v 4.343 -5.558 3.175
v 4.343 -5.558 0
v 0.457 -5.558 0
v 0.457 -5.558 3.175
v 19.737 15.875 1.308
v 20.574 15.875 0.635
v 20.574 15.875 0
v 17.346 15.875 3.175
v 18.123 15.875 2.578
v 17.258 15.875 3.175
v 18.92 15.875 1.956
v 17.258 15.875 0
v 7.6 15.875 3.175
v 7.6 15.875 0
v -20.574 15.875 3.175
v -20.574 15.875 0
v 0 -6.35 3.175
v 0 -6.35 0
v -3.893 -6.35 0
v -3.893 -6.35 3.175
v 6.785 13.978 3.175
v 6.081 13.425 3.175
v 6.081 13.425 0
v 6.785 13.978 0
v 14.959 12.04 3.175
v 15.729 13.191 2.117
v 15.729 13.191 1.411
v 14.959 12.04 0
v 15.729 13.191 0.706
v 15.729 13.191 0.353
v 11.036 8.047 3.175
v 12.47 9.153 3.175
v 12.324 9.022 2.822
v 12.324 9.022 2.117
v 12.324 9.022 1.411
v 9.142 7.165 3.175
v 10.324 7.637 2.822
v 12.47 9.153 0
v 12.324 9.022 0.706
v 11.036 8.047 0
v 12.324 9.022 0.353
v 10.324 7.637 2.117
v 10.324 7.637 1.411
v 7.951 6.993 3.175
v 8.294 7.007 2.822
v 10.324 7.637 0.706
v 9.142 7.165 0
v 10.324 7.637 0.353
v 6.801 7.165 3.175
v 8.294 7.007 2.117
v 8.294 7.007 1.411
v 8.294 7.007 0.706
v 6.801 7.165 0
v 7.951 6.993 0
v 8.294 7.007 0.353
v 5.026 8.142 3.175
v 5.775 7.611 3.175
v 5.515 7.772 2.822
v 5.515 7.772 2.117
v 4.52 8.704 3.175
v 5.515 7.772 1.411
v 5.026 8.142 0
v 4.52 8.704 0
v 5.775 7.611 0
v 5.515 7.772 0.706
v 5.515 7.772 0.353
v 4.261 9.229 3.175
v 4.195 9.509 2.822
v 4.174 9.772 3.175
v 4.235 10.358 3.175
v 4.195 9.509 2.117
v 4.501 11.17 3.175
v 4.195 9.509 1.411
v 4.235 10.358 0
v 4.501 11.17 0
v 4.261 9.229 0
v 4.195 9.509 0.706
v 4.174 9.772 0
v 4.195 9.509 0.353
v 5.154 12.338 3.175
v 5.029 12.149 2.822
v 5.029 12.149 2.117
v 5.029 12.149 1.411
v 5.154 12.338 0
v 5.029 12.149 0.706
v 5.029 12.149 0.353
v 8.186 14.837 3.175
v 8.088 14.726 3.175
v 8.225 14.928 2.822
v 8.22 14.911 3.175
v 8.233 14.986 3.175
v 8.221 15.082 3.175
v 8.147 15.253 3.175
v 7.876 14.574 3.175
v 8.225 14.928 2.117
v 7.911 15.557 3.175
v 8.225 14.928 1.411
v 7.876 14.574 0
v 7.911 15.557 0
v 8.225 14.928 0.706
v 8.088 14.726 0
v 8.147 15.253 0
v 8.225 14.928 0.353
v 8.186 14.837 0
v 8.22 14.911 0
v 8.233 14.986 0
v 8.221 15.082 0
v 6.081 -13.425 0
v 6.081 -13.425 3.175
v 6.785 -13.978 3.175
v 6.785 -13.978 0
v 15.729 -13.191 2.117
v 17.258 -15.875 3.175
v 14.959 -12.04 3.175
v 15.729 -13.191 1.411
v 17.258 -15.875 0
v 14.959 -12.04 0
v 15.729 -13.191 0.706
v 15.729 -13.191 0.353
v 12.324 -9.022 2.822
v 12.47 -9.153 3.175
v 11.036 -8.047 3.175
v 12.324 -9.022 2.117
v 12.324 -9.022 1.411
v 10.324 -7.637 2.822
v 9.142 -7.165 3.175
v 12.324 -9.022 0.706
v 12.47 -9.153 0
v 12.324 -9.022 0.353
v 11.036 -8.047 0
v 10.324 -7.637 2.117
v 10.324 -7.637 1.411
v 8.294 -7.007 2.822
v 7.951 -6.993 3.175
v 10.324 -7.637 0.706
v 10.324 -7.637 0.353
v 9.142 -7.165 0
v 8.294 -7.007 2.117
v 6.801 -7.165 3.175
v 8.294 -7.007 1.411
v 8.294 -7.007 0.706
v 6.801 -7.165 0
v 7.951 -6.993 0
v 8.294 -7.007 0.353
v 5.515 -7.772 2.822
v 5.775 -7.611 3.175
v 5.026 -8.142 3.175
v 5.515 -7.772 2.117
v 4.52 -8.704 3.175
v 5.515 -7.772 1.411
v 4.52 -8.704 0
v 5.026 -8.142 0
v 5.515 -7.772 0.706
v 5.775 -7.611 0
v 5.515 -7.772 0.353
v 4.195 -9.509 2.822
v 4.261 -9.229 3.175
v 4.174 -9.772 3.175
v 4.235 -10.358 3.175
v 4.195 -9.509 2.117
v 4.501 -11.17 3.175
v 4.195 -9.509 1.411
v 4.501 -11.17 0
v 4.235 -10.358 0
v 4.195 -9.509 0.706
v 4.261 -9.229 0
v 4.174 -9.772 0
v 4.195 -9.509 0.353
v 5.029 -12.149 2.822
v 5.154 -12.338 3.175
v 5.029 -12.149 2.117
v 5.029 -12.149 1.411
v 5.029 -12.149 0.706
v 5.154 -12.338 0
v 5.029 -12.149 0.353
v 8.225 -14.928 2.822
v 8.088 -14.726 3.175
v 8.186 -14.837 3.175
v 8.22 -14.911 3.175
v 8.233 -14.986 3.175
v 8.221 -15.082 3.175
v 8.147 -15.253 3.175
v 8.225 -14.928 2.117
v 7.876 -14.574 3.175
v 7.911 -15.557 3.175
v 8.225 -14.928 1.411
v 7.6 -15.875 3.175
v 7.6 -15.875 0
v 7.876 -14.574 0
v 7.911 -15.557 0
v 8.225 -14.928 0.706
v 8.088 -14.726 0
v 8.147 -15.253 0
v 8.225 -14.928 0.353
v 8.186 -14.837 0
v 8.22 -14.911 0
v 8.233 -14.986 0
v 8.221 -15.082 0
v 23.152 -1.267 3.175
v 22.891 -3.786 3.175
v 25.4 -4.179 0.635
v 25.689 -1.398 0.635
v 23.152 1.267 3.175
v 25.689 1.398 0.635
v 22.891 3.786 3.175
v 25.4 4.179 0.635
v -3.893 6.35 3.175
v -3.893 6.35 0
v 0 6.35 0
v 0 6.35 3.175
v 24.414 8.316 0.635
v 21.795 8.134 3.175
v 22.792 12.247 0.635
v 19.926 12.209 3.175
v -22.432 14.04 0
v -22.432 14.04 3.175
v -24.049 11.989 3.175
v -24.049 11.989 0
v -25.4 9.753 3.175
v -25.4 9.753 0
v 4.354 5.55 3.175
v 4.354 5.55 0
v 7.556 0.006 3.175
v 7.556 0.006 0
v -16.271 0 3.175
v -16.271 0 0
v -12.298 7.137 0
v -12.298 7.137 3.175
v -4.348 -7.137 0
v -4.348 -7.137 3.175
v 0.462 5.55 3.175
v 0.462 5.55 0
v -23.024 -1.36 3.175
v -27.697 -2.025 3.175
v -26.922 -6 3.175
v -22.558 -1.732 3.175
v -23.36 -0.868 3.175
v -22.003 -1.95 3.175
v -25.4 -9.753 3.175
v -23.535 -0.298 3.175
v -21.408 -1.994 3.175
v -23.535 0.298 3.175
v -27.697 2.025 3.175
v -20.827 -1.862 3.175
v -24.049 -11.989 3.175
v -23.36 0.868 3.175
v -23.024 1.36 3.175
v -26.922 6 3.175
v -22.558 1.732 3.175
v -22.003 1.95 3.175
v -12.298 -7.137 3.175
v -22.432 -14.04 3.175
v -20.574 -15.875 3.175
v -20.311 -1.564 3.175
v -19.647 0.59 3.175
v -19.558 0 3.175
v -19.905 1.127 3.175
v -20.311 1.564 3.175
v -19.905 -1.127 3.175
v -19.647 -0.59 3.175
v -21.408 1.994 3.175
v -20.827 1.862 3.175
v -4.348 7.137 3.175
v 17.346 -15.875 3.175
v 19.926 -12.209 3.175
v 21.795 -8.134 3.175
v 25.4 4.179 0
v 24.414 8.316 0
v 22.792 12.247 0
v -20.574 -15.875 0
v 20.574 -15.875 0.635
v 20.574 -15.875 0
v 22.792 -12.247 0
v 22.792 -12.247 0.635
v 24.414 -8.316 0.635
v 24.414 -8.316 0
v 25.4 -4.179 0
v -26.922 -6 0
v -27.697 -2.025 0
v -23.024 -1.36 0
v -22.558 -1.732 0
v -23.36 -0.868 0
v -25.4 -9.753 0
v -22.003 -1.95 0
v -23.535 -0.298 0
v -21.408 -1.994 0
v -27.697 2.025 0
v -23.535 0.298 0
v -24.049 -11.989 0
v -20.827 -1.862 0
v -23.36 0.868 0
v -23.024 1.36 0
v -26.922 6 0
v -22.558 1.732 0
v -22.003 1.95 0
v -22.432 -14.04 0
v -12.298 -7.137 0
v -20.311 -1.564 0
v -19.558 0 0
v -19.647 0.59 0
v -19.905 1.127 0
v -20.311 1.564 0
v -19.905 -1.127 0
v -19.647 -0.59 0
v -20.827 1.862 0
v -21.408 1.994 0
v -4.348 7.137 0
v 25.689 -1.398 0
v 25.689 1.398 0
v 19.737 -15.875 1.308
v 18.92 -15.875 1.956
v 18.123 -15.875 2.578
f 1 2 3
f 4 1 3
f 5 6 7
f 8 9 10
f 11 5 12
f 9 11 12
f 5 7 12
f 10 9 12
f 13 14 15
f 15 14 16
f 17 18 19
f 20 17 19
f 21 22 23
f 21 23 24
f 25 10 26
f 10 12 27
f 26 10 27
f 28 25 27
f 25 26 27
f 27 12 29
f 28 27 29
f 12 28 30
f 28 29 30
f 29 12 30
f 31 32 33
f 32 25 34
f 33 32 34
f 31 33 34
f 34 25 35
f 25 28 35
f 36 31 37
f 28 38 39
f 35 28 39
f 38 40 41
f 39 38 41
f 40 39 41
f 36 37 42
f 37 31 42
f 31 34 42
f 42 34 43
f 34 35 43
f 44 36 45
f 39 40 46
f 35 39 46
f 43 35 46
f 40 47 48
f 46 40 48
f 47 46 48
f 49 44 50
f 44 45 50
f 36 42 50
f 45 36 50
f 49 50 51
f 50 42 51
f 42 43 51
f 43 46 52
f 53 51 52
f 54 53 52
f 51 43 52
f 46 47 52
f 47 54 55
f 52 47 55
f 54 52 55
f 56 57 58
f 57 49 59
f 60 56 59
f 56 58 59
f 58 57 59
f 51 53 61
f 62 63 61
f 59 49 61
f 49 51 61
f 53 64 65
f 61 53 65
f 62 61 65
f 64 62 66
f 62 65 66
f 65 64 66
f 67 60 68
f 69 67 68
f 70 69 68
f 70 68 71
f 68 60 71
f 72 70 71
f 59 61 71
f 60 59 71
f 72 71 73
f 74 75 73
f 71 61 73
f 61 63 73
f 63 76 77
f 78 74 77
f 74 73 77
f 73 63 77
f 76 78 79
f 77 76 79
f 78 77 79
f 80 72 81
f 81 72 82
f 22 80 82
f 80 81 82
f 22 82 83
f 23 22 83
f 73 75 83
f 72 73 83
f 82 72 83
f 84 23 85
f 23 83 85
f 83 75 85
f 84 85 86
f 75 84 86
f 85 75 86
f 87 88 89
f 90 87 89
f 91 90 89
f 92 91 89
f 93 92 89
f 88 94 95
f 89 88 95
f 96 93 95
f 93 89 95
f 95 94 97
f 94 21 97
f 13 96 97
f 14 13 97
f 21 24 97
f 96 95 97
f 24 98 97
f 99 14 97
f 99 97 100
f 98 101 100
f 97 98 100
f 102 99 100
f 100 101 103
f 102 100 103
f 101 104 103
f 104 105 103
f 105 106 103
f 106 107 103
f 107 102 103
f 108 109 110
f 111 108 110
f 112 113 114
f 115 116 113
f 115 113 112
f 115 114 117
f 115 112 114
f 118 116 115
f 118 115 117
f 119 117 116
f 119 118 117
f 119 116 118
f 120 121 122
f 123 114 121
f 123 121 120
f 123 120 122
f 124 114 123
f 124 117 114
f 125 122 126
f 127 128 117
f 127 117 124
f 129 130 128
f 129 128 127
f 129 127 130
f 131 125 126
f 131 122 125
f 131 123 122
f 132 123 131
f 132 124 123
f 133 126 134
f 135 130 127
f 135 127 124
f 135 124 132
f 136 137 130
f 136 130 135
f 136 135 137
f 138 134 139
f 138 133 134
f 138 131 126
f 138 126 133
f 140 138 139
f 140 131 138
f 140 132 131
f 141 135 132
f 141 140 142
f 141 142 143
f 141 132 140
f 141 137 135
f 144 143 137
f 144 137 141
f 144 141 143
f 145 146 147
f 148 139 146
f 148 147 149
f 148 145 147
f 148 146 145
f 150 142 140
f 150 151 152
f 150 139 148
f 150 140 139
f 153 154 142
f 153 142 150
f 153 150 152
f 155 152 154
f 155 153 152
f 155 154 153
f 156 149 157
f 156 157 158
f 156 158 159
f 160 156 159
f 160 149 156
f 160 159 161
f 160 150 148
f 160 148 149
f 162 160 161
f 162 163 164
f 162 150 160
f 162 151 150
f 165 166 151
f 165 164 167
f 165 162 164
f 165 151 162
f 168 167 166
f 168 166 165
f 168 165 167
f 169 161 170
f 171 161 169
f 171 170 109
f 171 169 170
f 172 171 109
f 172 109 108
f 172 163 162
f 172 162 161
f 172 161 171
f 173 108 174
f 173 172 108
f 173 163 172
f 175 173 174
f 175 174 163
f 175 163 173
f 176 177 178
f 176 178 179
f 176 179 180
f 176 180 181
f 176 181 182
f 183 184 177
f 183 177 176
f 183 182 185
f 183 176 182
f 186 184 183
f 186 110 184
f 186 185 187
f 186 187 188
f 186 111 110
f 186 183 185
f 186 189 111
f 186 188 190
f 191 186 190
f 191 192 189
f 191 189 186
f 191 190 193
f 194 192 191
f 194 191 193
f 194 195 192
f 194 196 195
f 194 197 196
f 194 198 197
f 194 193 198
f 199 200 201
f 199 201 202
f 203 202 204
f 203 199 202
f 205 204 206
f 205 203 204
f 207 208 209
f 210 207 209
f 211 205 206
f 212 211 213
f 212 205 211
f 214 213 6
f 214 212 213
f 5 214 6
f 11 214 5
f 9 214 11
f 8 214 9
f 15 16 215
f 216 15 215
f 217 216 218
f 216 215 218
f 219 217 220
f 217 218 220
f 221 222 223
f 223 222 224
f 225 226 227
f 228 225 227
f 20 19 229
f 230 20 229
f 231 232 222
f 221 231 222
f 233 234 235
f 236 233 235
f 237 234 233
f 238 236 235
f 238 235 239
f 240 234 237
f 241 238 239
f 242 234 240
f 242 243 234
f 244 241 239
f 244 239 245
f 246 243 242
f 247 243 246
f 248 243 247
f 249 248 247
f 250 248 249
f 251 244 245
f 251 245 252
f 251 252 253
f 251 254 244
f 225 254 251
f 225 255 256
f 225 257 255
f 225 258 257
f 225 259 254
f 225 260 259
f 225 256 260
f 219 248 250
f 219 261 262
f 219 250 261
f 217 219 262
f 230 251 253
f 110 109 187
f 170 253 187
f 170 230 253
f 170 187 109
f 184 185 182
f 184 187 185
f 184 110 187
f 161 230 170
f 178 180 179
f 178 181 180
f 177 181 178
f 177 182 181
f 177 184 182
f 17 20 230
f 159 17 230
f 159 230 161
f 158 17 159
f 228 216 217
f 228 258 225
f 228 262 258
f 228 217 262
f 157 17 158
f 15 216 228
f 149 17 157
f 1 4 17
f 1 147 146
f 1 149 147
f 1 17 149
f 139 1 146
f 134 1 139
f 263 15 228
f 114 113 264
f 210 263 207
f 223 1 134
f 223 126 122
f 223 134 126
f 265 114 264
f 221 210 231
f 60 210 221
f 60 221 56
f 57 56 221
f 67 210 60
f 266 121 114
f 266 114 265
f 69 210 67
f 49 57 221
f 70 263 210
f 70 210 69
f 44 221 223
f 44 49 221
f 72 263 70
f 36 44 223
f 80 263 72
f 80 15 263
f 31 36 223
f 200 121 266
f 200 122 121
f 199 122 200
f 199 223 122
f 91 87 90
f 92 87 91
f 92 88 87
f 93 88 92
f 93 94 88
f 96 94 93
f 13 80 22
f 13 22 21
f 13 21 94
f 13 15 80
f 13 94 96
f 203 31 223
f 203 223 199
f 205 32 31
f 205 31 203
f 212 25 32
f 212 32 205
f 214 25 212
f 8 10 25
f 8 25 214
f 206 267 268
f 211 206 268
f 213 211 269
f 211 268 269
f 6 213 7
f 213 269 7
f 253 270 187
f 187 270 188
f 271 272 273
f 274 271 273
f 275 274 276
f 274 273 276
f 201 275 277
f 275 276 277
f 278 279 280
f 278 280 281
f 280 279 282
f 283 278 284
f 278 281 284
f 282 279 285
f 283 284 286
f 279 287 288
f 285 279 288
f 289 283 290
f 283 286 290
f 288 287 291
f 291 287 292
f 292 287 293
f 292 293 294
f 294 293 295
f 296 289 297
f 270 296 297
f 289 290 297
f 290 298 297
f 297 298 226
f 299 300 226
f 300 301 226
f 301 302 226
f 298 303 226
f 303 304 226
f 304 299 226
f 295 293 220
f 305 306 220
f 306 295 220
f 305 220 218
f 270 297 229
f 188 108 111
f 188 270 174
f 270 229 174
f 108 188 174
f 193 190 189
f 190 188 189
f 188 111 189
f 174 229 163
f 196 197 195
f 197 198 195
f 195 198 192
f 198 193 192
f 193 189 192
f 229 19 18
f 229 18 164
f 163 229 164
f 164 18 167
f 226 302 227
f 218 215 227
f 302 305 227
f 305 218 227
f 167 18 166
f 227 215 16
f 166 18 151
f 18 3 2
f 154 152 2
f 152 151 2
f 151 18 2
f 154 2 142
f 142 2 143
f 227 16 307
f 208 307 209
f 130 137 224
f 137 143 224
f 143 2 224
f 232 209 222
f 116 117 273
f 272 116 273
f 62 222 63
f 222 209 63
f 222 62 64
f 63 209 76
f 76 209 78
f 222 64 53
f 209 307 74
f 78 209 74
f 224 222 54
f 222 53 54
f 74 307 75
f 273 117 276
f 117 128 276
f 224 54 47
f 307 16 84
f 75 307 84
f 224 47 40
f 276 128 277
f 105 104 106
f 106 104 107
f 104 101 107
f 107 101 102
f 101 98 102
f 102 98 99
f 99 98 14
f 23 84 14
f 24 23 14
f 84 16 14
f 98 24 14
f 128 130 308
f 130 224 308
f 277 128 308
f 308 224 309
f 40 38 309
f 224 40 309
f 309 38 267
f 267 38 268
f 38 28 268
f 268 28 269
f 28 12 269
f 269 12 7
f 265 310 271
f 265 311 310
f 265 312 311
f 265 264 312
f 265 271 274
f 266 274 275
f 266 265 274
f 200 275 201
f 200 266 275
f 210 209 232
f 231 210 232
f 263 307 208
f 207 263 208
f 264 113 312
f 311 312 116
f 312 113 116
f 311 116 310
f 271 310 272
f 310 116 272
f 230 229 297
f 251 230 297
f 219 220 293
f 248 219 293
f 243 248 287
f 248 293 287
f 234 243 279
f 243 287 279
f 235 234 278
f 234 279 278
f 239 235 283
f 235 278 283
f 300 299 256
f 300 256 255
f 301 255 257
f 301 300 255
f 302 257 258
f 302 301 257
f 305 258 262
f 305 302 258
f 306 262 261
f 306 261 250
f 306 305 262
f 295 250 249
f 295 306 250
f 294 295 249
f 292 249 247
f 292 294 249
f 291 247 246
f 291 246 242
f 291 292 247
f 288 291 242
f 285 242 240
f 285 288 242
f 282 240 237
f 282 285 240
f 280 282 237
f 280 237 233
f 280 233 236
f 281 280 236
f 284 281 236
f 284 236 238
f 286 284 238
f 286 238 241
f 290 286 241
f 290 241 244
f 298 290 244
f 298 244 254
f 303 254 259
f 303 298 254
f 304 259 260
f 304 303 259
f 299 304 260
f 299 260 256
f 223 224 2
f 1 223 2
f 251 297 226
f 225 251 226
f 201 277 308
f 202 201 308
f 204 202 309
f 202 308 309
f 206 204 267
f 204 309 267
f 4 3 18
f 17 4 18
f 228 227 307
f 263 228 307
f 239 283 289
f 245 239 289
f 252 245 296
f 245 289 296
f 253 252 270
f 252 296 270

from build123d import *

# Parameters (mm, degrees)
F0_R     = 2
F1_DEPTH = 3.175
F2_SIZE2 = 2.54
F2_SIZE  = 2.54


with BuildPart() as f1:
    # F0 (on Top) → F1 (new body)
    with BuildSketch(Plane.XY):
        with BuildLine():
            Line((-25.4, -9.7533396771), (-25.4, 9.7533396771))
            ThreePointArc((-25.4, 9.7533396771), (-27.7943947705, 0), (-25.4, -9.7533396771))
        make_face()
        with BuildLine():
            Line((7.5996425003, 15.875), (-20.574, 15.875))
            ThreePointArc((-20.574, 15.875), (-23.2726776835, 13.0393833309), (-25.4, 9.7533396771))
            Line((-25.4, 9.7533396771), (-25.4, -9.7533396771))
            ThreePointArc((-25.4, -9.7533396771), (-23.2726776835, -13.0393833309), (-20.574, -15.875))
            Line((-20.574, -15.875), (7.5996425003, -15.875))
            add(Edge.make_bspline(
                [(17.2575954348, -15.875), (16.8118674755, -15.0360308318), (15.7777378861, -13.0895457095), (12.6385533239, -8.7628284751), (8.4438454096, -6.4903546022), (5.4576611574, -7.5578133093), (3.6996913649, -9.434816458), (4.9096520026, -12.30721807), (6.6995754798, -14.1477736043), (8.6865320781, -14.7997007485), (7.9445844593, -15.5337364181), (7.5996425003, -15.875)],
                knots=[0, 0, 0, 0, 0.1172509784, 0.2720329825, 0.4136469471, 0.5269156212, 0.6254604471, 0.7364742974, 0.8471369559, 0.9289318052, 1, 1, 1, 1], degree=3))
            Line((17.2575954348, -15.875), (19.5524021983, -15.875))
            ThreePointArc((19.5524021983, -15.875), (24.535980368, 0), (19.5524021983, 15.875))
            Line((19.5524021983, 15.875), (17.2575954348, 15.875))
            add(Edge.make_bspline(
                [(17.2575954348, 15.875), (16.8118674755, 15.0360308318), (15.7777378861, 13.0895457095), (12.6385533239, 8.7628284751), (8.4438454096, 6.4903546022), (5.4576611574, 7.5578133093), (3.6996913649, 9.434816458), (4.9096520026, 12.30721807), (6.6995754798, 14.1477736043), (8.6865320781, 14.7997007485), (7.9445844593, 15.5337364181), (7.5996425003, 15.875)],
                knots=[0, 0, 0, 0, 0.1172509784, 0.2720329825, 0.4136469471, 0.5269156212, 0.6254604471, 0.7364742974, 0.8471369559, 0.9289318052, 1, 1, 1, 1], degree=3))
        make_face()
        with Locations((-21.5576495975, 0)):
            Circle(F0_R, mode=Mode.SUBTRACT)
        Polygon((-16.2712801248, 0), (-12.2982449182, 7.1374), (-4.3480449182, 7.1374), (-3.8934393163, 6.35), (0, 6.35), (0.4617137668, 5.5502882974), (4.3540745974, 5.5502882974), (7.5559447504, 0.0061843585), (4.3434, -5.5581063708), (0.4572, -5.5581063708), (0, -6.35), (-3.8934393163, -6.35), (-4.3480449182, -7.1374), (-12.2982449182, -7.1374), align=None, mode=Mode.SUBTRACT)
        with BuildLine():
            ThreePointArc((25.4, -4.1788812389), (25.7248773783, 0), (25.4, 4.1788812389))
            Line((25.4, 4.1788812389), (25.4, -4.1788812389))
        make_face()
        with BuildLine():
            Line((20.574, 15.875), (19.5524021983, 15.875))
            ThreePointArc((19.5524021983, 15.875), (24.535980368, 0), (19.5524021983, -15.875))
            Line((19.5524021983, -15.875), (20.574, -15.875))
            ThreePointArc((20.574, -15.875), (23.6807693851, -10.3132006276), (25.4, -4.1788812389))
            Line((25.4, -4.1788812389), (25.4, 4.1788812389))
            ThreePointArc((25.4, 4.1788812389), (23.6807693851, 10.3132006276), (20.574, 15.875))
        make_face()
    extrude(amount=F1_DEPTH)

    # F2
    f2_edges = [f1.edges().sort_by_distance(p)[0] for p in [
        (25.724877, 0, 3.175),
    ]]
    chamfer(f2_edges, length=F2_SIZE, length2=F2_SIZE2)


solid = f1.part
